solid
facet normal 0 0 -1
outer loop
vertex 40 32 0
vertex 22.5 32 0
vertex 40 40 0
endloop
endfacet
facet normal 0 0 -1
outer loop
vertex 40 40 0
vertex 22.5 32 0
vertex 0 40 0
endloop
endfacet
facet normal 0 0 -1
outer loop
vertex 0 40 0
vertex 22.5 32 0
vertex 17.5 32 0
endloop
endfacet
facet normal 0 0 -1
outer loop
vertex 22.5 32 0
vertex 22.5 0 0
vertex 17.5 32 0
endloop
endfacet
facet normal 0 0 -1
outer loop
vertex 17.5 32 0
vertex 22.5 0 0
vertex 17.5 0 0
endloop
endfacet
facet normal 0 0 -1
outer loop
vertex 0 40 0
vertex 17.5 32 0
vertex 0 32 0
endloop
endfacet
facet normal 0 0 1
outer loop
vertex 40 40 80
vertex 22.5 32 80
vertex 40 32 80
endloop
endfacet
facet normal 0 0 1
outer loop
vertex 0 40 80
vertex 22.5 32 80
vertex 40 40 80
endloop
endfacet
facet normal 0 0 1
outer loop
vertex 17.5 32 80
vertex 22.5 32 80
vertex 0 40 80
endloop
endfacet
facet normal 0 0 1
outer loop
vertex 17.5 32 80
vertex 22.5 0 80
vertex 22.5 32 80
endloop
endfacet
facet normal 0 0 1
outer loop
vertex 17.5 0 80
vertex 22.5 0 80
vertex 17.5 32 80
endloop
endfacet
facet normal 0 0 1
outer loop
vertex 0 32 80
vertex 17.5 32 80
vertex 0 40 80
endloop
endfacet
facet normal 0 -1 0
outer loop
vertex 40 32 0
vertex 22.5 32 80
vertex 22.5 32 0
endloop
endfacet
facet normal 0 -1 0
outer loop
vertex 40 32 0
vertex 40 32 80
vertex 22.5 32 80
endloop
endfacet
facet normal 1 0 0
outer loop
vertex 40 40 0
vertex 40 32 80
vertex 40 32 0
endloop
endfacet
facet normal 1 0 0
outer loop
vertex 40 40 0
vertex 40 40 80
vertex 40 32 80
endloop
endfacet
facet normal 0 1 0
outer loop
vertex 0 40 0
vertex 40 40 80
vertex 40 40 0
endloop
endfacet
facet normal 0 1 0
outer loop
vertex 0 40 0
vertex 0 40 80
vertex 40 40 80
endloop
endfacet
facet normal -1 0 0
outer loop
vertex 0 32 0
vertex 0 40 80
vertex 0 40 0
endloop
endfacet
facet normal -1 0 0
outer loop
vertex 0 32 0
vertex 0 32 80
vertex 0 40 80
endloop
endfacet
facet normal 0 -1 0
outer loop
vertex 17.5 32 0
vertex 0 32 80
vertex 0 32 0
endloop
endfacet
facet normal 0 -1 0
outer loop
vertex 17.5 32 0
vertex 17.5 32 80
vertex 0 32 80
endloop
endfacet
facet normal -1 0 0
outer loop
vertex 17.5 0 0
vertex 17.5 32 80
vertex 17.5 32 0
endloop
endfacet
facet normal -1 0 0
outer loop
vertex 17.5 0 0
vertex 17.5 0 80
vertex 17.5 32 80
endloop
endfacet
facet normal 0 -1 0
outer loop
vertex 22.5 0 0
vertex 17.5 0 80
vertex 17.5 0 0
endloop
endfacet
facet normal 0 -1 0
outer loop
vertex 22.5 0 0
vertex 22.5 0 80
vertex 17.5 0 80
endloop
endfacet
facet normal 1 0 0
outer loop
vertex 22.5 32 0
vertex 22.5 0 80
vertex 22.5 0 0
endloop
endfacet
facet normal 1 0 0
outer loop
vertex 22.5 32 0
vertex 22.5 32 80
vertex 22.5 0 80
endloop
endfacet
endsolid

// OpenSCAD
$fn = 32;

// ----------------------------------------------------------------------
// Structural section: tee 40 x 40 mm
// ----------------------------------------------------------------------

// --- parameters (mm) ---
sec_w = 40;               // tee width, X
sec_h = 40;               // tee height, Y
flange_t = 8;             // top flange thickness
web_t = 5;                // web thickness
plate_t = 80;             // cut length, Z (extrusion height)

profile = [[17.5, 0], [22.5, 0], [22.5, 32], [40, 32], [40, 40], [0, 40], [0, 32], [17.5, 32]];  // primary outline, 8 points, counter clockwise

// --- the one profile operation ---
linear_extrude(height = plate_t) polygon(points = profile);
